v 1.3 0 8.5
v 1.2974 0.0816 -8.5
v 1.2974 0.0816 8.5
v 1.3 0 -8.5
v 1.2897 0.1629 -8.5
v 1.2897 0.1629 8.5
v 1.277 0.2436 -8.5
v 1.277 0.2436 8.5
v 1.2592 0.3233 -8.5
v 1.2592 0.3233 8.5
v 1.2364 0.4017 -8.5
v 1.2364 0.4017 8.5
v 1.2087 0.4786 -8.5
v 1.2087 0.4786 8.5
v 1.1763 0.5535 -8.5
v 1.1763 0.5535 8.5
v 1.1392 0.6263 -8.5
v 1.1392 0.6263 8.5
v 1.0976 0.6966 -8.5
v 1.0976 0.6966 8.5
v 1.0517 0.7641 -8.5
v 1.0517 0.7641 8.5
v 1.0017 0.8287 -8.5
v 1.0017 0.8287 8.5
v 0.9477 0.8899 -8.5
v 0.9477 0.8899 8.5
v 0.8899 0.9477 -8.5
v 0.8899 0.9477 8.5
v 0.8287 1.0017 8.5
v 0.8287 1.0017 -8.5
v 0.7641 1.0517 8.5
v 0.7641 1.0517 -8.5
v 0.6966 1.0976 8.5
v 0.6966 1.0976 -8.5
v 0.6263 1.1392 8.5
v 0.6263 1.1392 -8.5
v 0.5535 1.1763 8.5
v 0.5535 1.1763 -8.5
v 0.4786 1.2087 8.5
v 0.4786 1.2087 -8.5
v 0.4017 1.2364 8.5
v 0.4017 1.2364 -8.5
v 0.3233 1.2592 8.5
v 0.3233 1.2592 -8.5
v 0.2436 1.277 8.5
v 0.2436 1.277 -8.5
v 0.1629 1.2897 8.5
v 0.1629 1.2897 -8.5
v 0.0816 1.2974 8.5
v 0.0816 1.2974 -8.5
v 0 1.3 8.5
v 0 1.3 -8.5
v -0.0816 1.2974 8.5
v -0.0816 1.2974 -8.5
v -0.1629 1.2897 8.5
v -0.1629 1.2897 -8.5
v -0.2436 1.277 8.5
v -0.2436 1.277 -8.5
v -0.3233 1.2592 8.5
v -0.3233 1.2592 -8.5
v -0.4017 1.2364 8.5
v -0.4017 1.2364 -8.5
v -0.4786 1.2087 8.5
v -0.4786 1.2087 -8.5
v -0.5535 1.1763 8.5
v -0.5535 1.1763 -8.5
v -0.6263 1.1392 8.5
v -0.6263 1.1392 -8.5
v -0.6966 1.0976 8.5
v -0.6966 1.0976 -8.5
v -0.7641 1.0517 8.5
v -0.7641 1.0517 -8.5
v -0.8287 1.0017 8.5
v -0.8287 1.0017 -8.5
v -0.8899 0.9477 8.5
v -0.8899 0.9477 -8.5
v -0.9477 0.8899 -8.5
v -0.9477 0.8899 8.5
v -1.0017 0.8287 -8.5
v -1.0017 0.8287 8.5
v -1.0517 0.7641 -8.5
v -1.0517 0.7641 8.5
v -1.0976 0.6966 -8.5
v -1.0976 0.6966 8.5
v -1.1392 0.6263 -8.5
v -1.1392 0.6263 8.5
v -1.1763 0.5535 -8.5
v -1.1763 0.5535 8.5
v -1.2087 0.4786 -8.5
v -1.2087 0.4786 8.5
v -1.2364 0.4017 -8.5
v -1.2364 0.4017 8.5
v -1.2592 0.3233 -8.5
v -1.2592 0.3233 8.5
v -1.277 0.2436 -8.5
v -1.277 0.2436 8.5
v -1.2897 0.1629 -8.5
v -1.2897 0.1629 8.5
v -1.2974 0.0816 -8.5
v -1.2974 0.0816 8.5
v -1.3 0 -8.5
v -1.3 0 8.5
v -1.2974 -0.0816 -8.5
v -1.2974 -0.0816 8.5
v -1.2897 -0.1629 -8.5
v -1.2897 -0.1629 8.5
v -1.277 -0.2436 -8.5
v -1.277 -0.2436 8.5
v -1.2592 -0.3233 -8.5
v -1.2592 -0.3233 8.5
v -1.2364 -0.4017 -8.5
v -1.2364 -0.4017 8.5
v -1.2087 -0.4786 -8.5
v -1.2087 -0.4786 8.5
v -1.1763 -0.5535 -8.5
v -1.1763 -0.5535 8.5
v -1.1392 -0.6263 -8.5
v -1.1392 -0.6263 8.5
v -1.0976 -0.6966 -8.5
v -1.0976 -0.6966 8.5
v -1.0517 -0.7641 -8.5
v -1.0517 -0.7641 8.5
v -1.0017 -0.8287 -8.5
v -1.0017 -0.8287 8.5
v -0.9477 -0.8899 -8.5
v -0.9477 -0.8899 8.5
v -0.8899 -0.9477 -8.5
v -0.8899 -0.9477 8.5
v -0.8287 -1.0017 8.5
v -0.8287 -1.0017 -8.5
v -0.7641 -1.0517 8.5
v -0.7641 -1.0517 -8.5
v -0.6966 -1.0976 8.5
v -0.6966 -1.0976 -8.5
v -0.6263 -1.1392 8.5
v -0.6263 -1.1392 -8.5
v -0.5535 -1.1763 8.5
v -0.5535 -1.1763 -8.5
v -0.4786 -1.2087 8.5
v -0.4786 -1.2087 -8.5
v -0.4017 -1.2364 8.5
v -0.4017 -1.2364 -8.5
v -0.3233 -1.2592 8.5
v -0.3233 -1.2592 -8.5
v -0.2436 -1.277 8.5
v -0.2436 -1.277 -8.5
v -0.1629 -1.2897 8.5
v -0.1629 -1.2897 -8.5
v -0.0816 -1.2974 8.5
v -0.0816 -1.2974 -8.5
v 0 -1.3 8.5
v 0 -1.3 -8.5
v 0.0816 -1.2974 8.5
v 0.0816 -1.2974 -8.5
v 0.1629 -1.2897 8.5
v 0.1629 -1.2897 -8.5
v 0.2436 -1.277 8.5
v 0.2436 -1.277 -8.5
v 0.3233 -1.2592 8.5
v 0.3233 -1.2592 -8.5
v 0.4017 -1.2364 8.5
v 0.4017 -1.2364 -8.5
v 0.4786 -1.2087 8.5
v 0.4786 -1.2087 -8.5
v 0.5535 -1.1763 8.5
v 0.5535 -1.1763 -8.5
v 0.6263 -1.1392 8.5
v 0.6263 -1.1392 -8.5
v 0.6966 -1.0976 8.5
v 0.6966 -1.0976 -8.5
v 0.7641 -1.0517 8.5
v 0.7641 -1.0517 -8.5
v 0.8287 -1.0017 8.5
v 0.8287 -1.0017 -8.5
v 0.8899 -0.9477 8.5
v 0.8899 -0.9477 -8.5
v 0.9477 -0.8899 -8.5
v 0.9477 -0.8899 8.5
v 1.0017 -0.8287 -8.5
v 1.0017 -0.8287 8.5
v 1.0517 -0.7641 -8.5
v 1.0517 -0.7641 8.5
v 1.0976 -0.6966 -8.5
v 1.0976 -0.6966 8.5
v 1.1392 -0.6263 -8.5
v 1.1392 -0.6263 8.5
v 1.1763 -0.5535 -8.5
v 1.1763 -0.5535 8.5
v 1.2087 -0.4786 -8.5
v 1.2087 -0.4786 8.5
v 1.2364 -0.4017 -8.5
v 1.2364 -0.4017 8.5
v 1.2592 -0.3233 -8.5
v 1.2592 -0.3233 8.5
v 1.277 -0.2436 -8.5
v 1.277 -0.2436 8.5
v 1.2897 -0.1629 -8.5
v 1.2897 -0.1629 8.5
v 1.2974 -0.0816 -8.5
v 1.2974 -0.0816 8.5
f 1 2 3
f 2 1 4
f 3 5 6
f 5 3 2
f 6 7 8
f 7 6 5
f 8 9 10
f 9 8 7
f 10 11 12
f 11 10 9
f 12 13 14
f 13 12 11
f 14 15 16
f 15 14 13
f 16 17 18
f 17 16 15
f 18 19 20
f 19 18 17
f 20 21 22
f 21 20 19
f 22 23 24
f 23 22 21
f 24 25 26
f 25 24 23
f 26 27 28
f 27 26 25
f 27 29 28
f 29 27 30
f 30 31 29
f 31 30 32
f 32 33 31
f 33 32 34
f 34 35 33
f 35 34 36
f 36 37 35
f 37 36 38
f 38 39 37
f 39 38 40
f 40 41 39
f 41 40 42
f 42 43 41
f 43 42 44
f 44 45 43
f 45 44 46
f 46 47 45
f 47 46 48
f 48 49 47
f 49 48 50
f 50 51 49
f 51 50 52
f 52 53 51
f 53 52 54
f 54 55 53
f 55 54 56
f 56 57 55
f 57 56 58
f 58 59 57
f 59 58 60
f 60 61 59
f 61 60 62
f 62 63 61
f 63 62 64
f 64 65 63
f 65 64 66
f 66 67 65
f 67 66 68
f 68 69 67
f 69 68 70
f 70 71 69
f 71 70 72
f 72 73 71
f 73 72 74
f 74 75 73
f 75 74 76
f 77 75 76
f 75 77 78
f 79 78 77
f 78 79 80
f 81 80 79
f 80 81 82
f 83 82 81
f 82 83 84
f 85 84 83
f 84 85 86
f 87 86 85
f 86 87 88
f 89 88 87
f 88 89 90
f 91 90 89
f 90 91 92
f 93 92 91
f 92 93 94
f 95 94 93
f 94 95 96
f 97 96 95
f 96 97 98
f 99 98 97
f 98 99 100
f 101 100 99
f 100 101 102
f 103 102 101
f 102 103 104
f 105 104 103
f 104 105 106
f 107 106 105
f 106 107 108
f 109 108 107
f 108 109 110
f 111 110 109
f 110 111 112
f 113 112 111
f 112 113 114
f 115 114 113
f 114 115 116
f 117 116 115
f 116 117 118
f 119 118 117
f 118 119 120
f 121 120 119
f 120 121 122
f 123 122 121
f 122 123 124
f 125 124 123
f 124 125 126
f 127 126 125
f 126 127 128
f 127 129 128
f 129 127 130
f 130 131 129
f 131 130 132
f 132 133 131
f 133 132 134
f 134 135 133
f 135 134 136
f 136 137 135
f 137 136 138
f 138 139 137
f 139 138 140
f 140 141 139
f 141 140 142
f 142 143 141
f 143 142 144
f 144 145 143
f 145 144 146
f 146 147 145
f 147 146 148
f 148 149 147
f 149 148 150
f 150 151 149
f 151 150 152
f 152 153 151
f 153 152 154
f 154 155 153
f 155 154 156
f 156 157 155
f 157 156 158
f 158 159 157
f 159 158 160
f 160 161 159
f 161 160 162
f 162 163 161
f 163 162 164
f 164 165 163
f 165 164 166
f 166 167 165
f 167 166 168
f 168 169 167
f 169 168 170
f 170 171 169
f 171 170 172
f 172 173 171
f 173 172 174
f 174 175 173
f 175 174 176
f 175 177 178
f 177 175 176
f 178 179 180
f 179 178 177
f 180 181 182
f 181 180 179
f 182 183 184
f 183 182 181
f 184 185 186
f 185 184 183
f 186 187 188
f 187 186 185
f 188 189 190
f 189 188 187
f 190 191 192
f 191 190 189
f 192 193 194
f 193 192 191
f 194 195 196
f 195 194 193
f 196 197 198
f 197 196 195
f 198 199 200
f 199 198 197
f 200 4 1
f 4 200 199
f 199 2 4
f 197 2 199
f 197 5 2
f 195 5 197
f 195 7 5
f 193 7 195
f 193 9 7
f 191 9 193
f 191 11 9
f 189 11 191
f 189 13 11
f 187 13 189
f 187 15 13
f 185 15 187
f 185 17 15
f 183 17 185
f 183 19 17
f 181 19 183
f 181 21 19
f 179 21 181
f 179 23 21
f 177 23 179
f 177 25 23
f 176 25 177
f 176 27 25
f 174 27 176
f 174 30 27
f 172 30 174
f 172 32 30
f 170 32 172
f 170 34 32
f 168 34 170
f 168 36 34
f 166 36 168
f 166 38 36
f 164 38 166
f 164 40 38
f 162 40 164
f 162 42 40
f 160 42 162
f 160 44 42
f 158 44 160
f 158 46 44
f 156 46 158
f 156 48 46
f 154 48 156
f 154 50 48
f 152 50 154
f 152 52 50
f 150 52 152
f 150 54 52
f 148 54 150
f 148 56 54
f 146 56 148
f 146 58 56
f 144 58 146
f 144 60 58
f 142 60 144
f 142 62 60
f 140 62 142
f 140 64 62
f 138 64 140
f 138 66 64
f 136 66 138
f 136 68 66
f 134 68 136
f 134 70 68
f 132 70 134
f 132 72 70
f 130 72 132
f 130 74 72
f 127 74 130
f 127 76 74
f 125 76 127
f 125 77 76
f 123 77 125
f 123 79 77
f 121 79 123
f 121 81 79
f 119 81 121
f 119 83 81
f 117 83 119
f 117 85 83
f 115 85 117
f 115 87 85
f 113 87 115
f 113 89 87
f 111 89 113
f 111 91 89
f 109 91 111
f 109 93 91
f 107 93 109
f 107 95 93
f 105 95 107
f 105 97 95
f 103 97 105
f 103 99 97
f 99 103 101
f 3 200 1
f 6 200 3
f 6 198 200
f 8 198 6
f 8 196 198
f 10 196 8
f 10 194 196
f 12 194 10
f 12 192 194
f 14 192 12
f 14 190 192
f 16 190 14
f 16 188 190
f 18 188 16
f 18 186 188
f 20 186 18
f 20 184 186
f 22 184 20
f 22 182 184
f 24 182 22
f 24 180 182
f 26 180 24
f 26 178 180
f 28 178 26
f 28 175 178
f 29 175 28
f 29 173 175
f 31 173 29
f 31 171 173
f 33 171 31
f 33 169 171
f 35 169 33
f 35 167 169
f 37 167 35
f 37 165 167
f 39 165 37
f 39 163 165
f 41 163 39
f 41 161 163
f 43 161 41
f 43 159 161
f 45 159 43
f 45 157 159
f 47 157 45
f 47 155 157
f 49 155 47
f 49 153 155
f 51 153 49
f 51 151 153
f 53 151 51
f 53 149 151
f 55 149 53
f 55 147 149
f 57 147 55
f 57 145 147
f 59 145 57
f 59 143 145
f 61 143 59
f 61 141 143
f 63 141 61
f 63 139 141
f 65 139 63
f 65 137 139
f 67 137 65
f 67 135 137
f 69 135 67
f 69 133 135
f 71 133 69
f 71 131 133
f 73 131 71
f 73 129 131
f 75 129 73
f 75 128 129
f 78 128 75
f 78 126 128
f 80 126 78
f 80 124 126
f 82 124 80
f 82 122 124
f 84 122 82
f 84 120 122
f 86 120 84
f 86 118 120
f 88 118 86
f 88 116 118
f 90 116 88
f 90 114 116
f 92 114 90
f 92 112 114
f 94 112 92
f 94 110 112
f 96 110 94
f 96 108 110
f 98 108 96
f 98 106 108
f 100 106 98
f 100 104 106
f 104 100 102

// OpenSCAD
$fn=100;


//difference(){
//rotate([0,0,90])
//docking();
//
//translate([-40, -20, -10])
//cube([80,100,50]);
//}

//bump_switch();

cylinder(h=17, d=2.6, center=true);


//translate([0,-16,5.5])
//plug_holder1();


//color("blue", alpha=0.5){
//    cube([11,15.9,20.9], center=true);
//}

//plug_switch();

 
//translate([-0.5,-5, 2])
//load_metal_bar();

//difference()
//{
//dock_walmart();
////
////translate([10,-25, 10])
////cube([60,100,60], center=true);
//}

//measurement check
//translate([0,15, 16.4])
//cube([70,30,26.8], center=true);

//rotate([0,0,90]) {
//    docking_screw(); 
// simplebar(conn_h=3);
//// translate([40,3,1.5+1.5+2.0])
////    cube([10,24.5+8,3], center=true); 
//}

module bump_switch(){
    h2h_outer=12.3;
    h2h_d=9.4;
    
    
    d=13;
    w=18;
    l=8;
    difference(){
    union(){
        translate([0,0,d/2+1-0.1 ])
        cube([l, w, 2], center=true);
        translate([0,0,-d/2 - 1+0.1 ])
        cube([l, w, 2], center=true);
        
        translate([-3-2.5,0,0])
        cube([3,w-6,d+3.8], center=true);
        
        translate([-11, 0, 0])
        rotate([0,90,0])
        cylinder(h=8, d=8.4, center=true);
    }
    

    
    translate([1.5, 0, -5]){
        translate([0, h2h_d/2, 0])
        cylinder(h=30, d=2.7, center=true);
        translate([0, -h2h_d/2, 0])
        cylinder(h=30, d=2.7, center=true);
    }
    
}

    //measurement

//    translate([4,0,5])
//    color("red", alpha=0.4)
//    cube([4,h2h_outer, d], center=true);
    
    
}

module dock_walmart(){
    mid_h=26.5-1-0.5;  
 
 
//mid_h=27.3;  // mid space+2bar

//23.45+2*1.9
   
   difference()
    { 
    union(){
clamp_bar();
translate([0,0,mid_h+ 6.4])
rotate([0,180,0])
clamp_bar();


translate([25.5,0, 1 ])
cube([22,94.4,4], center=true);  
    
translate([25.5,0, 30.38 ])
cube([22,94.4,4], center=true);  
    
translate([34.5,0,16 ])
cube([4,94.4,31], center=true);  
    }
    
////conns
translate([30,-38 ,16]) 
rotate([0,90,0])
  cylinder(h=20, d=5  , center=true);
 
translate([30, 38 ,16]) 
rotate([0,90,0])
  cylinder(h=20, d=5  , center=true);
    
    
    translate([24,-38 ,16]) 
//rotate([0,90,0])
  cylinder(h=40, d=5  , center=true);
 
translate([24, 38 ,16]) 
//rotate([0,90,0])
  cylinder(h=40, d=5  , center=true);
    
    
}



}

module pillers(){
translate([12.25,-44.20,14])
cube([6,6,19], center=true);
translate([-12.25,-44.20,14])
cube([6,6,19], center=true);
}


module clamp_bar(){
    difference()
    {
rotate([0,0,90]) {
    
    difference(){
    union(){
cube([94.42, 24.5+6, 1.95], center=true); 

translate([40.2,0,1.5+3])
 cover();
    
translate([-42.2,0,1.5+3])
 cover();
}
    translate([-46,0,0])
    cube([10,4,20], center=true); //small cut
}
}

c=0.2; //clearence
translate([0,0,2])
cube([24.5+c,94.42+c ,1.95+c], center=true); //metal_bar size

}
}

module cover(){
    
    translate([1,0,-1.5])
    cube([12,24.5+6,6], center=true);
   
//    cube([10,24.5+8+10,3], center=true); 
//    translate([0,-14.763,-2])
//    cube([10,3,3], center=true);   
//     
//         translate([0, 14.763,-2])
//    cube([10,3,3], center=true);  
 
}

module load_metal_bar(){
scale(1020)
//rotate([0,0,90])
import("/home/ns/charger_design/metal_bar.stl", center=true);
    
    // translate([-5,10,0])
//cube([94.42, 24.5, 1.95], center=true); 
// 
}

module plug_switch(){
//    so far working good. 

translate([50,0,20])
rotate([0,90,0]) {
    
difference(){ 
    union(){ 
        difference()
        {
            translate([0,0,10])
        cylinder(h=40, r=13.6+2, center=true);
            translate([0, 0,10])
        cylinder(h=40+10 , r=13.6, center=true);
            
            translate([-20,0,5])
        cube([20, 40, 50+10], center=true);
        }
        
//        two sides

//        translate([-8,13.5,-20])
//        cube([10, 2 , 40]);
//
//        translate([-8,-13.5-2,-20])
//        cube([10, 2 , 40]);
    }

//    connector hole. 
    translate([0, 0,0])
    rotate([90,0,0])
    cylinder(h=50, d=3.5 , center=true);
       
}

    translate([16,0,40]){ 
        difference(){
        //base
        cube([4,20,100], center=true); 
        //    two holes. 
            translate([0, 0,6.5])
            rotate([0,90,0]) {
            cylinder(h=10,d=5.5, center=true);
                
                translate([-30, 0,0])
                cylinder(h=10,d=5.5, center=true);
            }
        } 
    }

}
}







module plug_holder1(){
w=11;
d=15.9-0.3;
h=21+8;
 
    
    difference()
    {
        
    union(){
    //base
    translate([0,14+2,-14-4])
    cube([24, d+8, 4], center=true); 
    
    //two sides
    translate([0,6.2,-2])
    cube([w, 4, h], center=true);

    translate([0, d+10.2,-2])
    cube([w, 4, h], center=true);
        

    }
        
        translate([0,15,7.0])
        rotate([90,0,0])
        cylinder(h=50, d=5 , center=true);
           
   }
   
   //base conn 
        rotate([0,90,0])
       translate([18,16,23.5]){ 
           //measurement. 
//            translate([-10,-15,-29])
//           cube([10,30,33]);
           
        difference(){
        //base
            translate([0,0,15])
        cube([4,d+8,65], center=true); 
        //    two holes. 
            translate([0, 0,6.5])
            rotate([0,90,0]) {
            cylinder(h=10,d=5, center=true);
                
                translate([-30.2, 0,0])
                cylinder(h=10,d=5, center=true);
            }
        } 
    }
   
   
   
}



module docking(){

mid_h=23.45;  //to reduce 0.6mmm
bar_h=1.9;    
conn_h=4;
    
//mid_h=27.3;  // mid space+2bar

//23.45+2*1.9
    
simplebar(conn_h=conn_h);
translate([0,0,mid_h+2*bar_h+conn_h])
simplebar(conn_h=conn_h);

//measurement check
//translate([20,15, 27.25/2+ conn_h/2])
//cube([70,30,27.3], center=true);


    //back connection
    translate([0, 32.8 , 20-4.35]) {
        difference(){
        cube([105,5,35.25], center=true);

            translate([0, 0,0])
            rotate([90, 0, 0]){
                translate([44-4,0,0])
                cylinder(h=20, d=5 , center=true);

                translate([-44+4,0,0])
                cylinder(h=20, d=5  , center=true);
            }
        }
    }
    
}

module simplebar(conn_h=3){ //bar connector
    
    
   yoff=20;
   difference(){
       translate([0,yoff/2,0])
    cube([95+10, 25+yoff, conn_h], center=true);

    translate([44-4,0,0])
    cylinder(h=20, d=5  , center=true);

    translate([-44+4,0,0])
    cylinder(h=20, d=5 , center=true);
       
           
//    translate([0,0,-3])
//cube([40,10+yoff,20], center=true);

    } 
    
    
//    translate([0,0,-3])
//cube([88,5,5], center=true);

//95-73=22/2=11
//95-7=88/2=44
}




module docking_screw(){

mid_h=23.45;  //to reduce 0.6mmm
bar_h=1.9;    
conn_h=4;
    
//mid_h=27.3;  // mid space+2bar

//23.45+2*1.9
    
simplebar(conn_h=conn_h);
translate([0,0,mid_h+2*bar_h+conn_h])
simplebar(conn_h=conn_h);

//measurement check
//translate([20,15, 27.25/2+ conn_h/2])
//cube([70,30,27.3], center=true);


    //back connection
    translate([0, 32.8 , 20-4.35]) {
        difference(){
        cube([105,5,35.25], center=true);

            translate([0, 0,0])
            rotate([90, 0, 0]){
                translate([44-4,0,0])
                cylinder(h=20, d=5 , center=true);

                translate([-44+4,0,0])
                cylinder(h=20, d=5  , center=true);
            }
        }
    }
    
}
